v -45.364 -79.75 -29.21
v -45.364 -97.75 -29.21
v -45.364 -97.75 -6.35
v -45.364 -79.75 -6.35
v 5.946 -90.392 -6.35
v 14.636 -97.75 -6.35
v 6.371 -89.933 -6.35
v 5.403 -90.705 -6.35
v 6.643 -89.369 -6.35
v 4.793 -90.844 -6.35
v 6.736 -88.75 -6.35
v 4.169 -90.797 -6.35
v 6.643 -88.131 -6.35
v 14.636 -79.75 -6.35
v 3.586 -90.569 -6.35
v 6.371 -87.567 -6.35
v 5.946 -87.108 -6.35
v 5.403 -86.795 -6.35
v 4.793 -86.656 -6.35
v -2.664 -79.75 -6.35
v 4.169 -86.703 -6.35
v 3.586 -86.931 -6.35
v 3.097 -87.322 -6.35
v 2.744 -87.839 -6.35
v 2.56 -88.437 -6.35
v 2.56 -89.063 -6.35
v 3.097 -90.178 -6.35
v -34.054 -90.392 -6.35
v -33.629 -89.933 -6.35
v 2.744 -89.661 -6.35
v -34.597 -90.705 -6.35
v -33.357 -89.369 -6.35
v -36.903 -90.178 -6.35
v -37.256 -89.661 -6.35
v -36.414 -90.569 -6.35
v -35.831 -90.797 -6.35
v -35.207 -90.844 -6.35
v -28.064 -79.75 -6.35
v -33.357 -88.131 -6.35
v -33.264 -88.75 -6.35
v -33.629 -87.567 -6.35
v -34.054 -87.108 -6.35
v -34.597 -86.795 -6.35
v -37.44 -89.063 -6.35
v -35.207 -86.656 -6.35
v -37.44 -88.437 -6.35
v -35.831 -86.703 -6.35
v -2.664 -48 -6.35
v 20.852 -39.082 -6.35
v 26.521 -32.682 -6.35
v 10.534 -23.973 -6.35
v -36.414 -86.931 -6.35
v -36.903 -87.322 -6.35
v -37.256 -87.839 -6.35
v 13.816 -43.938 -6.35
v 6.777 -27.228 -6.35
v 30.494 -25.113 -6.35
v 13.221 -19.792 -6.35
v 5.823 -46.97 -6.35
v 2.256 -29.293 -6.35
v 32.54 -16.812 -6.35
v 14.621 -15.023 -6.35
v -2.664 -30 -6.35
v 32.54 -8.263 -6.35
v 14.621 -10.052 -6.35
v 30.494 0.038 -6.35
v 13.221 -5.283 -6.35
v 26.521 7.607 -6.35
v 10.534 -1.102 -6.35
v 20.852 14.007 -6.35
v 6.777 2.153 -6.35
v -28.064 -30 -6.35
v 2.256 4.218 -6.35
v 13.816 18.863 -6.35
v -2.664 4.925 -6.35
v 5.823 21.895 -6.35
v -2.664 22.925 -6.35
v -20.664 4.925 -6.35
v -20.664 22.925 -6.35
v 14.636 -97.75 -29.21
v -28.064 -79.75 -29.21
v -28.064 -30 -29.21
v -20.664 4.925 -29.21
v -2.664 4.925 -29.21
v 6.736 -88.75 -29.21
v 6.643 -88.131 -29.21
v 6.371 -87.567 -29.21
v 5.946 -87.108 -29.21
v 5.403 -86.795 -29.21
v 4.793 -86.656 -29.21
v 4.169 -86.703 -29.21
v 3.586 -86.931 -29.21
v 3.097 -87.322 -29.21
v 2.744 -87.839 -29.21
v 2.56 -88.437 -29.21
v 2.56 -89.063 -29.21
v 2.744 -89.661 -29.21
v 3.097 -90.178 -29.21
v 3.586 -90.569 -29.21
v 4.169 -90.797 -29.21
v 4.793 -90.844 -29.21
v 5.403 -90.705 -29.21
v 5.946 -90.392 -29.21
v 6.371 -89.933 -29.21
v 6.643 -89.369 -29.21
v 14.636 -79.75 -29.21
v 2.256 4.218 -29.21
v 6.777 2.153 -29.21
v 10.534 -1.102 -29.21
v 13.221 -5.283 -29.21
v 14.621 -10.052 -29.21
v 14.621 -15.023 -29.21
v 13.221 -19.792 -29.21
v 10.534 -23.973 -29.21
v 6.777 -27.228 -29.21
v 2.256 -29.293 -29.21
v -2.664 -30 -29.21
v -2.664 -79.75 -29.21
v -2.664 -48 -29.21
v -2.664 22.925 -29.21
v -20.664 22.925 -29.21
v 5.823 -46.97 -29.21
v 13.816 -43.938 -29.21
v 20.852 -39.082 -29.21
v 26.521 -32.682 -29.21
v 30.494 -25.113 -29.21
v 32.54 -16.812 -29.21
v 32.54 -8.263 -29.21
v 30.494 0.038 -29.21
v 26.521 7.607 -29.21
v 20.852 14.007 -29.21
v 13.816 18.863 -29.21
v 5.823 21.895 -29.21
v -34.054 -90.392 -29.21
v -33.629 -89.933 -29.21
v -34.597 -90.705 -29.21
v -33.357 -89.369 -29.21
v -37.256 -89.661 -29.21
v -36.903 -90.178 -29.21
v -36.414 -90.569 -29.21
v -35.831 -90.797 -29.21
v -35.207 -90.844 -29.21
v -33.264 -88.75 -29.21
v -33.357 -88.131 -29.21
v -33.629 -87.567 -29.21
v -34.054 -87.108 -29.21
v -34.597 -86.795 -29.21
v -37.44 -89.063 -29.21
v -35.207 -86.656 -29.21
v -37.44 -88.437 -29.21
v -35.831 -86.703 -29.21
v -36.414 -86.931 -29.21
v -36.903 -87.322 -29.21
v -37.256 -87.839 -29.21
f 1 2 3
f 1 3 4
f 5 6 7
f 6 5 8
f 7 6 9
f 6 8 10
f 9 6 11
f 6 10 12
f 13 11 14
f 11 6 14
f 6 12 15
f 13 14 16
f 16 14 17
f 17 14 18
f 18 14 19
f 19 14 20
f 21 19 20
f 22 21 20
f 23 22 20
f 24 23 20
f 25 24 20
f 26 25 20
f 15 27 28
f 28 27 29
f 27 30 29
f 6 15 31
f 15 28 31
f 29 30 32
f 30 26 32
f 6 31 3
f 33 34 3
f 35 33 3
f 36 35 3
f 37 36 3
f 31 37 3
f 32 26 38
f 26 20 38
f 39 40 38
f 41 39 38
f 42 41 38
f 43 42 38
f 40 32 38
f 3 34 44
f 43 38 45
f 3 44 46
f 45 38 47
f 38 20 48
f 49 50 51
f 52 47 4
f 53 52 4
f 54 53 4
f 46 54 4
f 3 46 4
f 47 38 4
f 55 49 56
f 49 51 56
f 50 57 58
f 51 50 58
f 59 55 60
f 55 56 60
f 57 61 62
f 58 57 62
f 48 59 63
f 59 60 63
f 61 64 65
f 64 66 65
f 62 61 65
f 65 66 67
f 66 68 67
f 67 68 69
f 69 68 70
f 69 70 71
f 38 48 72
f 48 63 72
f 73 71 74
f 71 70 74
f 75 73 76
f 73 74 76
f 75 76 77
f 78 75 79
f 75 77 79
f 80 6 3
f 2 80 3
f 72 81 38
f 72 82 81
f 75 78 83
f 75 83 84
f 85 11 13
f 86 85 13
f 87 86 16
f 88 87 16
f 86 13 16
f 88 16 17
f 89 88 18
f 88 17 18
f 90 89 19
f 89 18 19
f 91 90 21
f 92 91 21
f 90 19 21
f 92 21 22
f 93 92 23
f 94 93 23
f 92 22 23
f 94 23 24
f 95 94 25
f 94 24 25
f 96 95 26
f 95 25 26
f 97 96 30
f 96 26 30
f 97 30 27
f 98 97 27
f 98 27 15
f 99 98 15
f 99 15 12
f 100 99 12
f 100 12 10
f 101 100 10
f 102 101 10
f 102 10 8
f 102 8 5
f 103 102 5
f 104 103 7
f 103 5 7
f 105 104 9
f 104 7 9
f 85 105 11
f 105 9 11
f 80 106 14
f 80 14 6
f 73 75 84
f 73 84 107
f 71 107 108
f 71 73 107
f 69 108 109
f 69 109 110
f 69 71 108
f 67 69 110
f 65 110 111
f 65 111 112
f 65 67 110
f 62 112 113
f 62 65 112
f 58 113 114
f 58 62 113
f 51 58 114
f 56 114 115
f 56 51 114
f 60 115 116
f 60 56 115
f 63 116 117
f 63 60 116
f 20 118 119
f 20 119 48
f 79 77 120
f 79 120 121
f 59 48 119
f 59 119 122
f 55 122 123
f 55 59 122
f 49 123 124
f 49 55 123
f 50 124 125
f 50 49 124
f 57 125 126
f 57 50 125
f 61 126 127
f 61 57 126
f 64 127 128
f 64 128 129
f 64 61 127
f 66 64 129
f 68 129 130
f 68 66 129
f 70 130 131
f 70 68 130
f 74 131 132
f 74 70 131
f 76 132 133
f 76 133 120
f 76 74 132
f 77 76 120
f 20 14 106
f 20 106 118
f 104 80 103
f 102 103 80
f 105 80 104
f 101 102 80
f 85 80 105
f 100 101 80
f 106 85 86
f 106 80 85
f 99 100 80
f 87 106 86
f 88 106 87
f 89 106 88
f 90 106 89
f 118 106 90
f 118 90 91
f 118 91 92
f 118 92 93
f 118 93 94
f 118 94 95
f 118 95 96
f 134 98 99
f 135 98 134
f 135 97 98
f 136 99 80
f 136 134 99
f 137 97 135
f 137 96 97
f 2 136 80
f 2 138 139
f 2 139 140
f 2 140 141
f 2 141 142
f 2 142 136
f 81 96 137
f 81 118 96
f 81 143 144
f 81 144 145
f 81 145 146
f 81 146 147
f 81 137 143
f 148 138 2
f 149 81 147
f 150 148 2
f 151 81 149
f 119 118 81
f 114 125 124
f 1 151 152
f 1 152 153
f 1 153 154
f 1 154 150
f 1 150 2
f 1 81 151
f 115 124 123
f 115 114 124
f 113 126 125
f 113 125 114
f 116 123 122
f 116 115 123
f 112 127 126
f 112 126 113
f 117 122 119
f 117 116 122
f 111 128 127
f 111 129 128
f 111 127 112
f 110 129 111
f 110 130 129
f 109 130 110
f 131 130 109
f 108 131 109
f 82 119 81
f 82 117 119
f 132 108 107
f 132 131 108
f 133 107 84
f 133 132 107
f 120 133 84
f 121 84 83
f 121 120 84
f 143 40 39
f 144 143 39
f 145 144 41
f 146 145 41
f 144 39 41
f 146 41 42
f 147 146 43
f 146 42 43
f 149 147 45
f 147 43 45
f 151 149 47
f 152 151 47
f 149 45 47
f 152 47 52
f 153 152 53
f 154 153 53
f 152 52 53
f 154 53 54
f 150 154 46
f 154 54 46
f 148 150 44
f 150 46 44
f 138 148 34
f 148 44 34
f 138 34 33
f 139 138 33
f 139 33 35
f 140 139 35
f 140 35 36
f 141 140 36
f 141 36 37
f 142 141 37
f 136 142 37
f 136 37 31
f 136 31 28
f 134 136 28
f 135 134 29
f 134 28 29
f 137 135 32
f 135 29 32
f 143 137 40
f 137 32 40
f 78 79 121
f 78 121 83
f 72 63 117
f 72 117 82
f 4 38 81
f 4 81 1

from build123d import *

# Parameters (mm, degrees)
BOSS_EXTRUDE1_DEPTH = 22.86
SKETCH4_W           = 25.40000152
SKETCH4_H           = 22.86
BOSS_EXTRUDE2_DEPTH = 31.75
BOSS_EXTRUDE3_DEPTH = 22.86
SKETCH6_R           = 2.100001769
CUT_EXTRUDE1_DEPTH  = 22.86


with BuildPart() as part:
    # Sketch3 → Boss-Extrude1 (new body)
    with BuildSketch(Plane.XY.offset(-6.35)):
        with BuildLine():
            Line((-28.0637741, -48), (-2.66377258, -48))
            ThreePointArc((-2.66377258, -48), (32.79872742, -12.5375), (-2.66377258, 22.925))
            Line((-2.66377258, 22.925), (-20.6637745, 22.925))
            Line((-20.6637745, 22.925), (-20.6637745, 4.925))
            Line((-20.6637745, 4.925), (-2.66377258, 4.925))
            ThreePointArc((-2.66377258, 4.925), (14.79872742, -12.5375), (-2.66377258, -30))
            Line((-2.66377258, -30), (-28.0637741, -30))
            Line((-28.0637741, -30), (-28.0637741, -48))
        make_face()
    extrude(amount=-BOSS_EXTRUDE1_DEPTH)

    # Sketch4 → Boss-Extrude2 (add)
    with BuildSketch(Plane.XZ.offset(48)):
        with Locations((-15.36377334, -17.78)):
            Rectangle(SKETCH4_W, SKETCH4_H)
    extrude(amount=BOSS_EXTRUDE2_DEPTH)

    # Sketch5 → Boss-Extrude3 (add)
    with BuildSketch(Plane.XY.offset(-6.35)):
        Polygon((-15.36377334, -79.75), (14.636226604, -79.75), (14.636226604, -97.750000068), (-45.363773284, -97.750000068), (-45.363773284, -79.75), align=None)
    extrude(amount=-BOSS_EXTRUDE3_DEPTH)

    # Sketch6 → Cut-Extrude1 (cut)
    with BuildSketch(Plane.XY.offset(-6.35)):
        with Locations((-35.363773472, -88.750000034)):
            Circle(SKETCH6_R)
        with Locations((4.636226792, -88.750000034)):
            Circle(SKETCH6_R)
    extrude(amount=-CUT_EXTRUDE1_DEPTH, mode=Mode.SUBTRACT)


solid = part.part
